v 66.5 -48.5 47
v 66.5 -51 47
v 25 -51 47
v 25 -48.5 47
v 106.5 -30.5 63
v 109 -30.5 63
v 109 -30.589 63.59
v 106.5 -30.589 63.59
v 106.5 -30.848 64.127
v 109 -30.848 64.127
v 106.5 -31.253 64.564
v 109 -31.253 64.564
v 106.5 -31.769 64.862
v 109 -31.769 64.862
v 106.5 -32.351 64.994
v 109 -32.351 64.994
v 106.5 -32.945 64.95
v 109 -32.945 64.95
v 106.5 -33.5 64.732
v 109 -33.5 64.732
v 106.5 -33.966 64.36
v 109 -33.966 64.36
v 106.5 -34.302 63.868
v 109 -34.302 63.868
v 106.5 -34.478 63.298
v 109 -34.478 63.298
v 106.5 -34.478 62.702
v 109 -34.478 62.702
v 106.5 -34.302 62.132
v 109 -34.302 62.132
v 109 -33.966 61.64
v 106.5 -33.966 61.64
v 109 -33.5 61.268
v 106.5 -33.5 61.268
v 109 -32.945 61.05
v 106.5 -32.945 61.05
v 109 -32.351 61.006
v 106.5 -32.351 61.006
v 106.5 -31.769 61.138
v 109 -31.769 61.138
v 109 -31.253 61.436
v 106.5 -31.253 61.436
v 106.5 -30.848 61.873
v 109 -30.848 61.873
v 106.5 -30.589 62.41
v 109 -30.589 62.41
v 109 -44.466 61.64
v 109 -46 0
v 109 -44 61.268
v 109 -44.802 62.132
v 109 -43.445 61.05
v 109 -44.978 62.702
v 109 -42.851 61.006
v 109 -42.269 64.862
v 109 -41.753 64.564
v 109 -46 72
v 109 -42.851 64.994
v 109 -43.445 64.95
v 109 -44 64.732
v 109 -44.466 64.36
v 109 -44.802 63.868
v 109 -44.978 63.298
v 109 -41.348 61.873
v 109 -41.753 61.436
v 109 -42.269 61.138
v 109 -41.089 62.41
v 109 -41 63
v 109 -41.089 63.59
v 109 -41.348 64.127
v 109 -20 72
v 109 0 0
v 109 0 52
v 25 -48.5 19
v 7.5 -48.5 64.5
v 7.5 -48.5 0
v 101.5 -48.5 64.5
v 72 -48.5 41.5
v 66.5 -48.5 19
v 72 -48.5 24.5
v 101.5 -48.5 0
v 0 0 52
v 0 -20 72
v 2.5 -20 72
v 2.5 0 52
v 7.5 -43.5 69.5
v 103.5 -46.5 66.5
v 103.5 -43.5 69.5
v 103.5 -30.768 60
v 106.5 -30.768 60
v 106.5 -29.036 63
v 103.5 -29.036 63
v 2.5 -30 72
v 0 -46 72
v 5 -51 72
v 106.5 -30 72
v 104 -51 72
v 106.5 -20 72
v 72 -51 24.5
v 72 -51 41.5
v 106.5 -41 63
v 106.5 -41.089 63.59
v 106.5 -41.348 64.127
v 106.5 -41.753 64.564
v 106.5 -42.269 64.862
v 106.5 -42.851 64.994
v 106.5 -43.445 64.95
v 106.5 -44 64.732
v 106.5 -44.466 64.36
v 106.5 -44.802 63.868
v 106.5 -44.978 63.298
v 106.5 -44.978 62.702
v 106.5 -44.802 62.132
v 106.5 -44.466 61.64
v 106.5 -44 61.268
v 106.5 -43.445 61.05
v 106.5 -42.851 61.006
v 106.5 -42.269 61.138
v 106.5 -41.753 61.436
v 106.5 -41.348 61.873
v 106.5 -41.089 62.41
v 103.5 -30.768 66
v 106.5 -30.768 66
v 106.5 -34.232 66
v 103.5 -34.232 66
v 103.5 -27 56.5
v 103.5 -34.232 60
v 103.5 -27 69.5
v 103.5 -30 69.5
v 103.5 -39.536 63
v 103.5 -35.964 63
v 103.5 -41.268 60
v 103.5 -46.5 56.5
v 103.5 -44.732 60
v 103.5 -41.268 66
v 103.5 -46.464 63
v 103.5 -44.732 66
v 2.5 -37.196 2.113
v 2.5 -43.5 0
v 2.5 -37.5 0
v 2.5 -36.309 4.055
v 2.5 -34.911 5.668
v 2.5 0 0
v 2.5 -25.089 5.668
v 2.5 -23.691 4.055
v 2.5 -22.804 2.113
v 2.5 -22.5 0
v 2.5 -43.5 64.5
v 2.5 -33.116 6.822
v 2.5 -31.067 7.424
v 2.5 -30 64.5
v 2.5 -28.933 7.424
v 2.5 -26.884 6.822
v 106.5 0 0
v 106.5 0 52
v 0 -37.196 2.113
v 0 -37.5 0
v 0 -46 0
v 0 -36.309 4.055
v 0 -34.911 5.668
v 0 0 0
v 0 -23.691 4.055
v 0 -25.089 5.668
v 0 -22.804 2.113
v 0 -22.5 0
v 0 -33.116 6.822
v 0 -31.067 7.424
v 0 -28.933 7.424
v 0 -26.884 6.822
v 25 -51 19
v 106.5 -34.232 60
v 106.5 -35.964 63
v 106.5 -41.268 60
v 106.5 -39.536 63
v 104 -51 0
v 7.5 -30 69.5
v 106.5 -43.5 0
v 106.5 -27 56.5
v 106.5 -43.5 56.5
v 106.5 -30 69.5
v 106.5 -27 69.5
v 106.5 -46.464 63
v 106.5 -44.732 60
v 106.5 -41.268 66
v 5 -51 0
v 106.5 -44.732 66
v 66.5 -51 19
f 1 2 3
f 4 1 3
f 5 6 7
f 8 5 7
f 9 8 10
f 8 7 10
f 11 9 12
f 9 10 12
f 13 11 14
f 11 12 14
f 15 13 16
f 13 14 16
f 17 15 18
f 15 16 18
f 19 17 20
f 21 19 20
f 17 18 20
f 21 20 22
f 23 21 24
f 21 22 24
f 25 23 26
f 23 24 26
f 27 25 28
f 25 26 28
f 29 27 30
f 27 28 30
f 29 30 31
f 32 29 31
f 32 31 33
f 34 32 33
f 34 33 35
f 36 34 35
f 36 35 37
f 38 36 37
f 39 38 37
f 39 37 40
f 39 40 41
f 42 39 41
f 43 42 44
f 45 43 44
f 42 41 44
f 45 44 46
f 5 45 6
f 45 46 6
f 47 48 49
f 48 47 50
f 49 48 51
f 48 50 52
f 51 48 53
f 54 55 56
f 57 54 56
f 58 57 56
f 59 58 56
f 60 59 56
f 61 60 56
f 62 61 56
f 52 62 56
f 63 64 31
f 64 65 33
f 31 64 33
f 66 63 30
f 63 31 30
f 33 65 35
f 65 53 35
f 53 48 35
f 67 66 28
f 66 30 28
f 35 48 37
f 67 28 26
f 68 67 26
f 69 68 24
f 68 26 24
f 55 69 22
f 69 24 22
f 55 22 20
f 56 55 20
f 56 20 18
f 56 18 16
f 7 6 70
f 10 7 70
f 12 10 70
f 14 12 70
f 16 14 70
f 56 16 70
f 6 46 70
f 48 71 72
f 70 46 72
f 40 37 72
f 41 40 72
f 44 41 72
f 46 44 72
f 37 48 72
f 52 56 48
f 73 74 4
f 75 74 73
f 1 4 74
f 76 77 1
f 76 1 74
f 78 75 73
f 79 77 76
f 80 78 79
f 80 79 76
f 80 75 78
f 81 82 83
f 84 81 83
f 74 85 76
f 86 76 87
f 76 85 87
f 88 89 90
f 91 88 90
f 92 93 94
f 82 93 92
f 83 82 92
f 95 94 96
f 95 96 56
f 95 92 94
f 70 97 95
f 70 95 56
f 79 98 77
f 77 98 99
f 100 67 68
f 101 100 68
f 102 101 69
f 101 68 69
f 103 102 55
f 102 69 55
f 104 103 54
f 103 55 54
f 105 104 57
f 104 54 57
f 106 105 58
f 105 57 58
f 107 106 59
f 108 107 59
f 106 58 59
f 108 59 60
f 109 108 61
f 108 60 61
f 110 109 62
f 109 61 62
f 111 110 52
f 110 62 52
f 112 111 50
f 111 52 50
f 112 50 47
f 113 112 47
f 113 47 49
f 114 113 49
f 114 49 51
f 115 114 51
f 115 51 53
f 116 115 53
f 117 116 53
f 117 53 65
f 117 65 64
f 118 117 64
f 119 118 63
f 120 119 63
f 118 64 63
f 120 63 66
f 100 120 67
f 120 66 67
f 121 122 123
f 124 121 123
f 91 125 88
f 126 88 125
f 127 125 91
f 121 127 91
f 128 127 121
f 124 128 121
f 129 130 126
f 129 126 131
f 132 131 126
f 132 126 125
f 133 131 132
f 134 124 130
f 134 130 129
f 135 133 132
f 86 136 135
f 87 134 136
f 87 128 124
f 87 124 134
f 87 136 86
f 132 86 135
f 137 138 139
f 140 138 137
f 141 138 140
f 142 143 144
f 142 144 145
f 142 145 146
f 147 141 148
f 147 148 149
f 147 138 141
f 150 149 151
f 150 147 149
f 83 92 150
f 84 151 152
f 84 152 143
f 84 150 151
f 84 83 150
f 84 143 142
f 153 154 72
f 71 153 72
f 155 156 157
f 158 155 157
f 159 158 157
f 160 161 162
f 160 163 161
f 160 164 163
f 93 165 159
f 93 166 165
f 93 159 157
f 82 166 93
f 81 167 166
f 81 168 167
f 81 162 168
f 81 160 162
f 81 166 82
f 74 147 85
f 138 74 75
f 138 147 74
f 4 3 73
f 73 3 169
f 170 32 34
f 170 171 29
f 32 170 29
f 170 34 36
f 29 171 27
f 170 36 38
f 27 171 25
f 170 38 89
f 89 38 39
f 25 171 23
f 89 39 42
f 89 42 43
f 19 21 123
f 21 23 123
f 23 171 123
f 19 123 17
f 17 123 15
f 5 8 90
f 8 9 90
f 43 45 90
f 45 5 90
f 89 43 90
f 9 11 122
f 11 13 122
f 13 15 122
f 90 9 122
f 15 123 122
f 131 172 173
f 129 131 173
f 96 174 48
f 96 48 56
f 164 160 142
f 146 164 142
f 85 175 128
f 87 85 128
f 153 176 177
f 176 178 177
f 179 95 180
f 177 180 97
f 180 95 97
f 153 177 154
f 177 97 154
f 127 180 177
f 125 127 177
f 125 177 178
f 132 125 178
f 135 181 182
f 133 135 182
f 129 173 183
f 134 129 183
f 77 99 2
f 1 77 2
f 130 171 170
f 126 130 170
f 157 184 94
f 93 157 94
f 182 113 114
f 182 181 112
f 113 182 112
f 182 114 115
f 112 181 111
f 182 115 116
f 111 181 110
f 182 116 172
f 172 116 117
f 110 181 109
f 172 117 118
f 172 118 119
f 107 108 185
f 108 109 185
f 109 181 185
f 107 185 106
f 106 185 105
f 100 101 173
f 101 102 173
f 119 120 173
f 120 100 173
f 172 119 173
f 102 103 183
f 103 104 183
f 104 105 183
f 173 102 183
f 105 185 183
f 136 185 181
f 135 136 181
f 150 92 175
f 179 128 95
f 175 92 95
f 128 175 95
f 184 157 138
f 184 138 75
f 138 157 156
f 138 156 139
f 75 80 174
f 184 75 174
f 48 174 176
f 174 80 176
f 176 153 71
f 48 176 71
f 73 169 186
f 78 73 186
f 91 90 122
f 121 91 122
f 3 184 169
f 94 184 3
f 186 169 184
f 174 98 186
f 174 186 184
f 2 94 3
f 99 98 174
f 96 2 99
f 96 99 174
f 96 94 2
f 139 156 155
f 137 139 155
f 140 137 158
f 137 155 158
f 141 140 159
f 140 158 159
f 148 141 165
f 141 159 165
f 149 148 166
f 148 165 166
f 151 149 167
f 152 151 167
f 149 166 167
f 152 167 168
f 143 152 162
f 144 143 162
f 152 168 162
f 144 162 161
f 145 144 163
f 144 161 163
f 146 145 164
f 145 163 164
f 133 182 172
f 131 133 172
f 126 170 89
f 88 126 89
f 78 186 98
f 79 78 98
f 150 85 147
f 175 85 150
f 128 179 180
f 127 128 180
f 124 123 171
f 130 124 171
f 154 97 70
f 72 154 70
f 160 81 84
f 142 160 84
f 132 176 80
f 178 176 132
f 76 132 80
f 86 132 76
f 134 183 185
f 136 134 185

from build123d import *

# Parameters (mm, degrees)
F0_W      = 109
F0_H      = 72
F1_DEPTH  = 51
F2_T      = -2.5
F3_W      = 104
F3_H      = 30
F4_DEPTH  = 2.5
F5_R      = 2
F6_DEPTH  = 2.5
F7_SIZE   = 20
F8_W      = 104
F8_H      = 48.5
F9_DEPTH  = 2.5
F11_DEPTH = 2.5
F14_DEPTH = 3
F15_DEPTH = 2.5
F16_SIZE  = 5
F17_SIZE  = 5


with BuildPart() as f1:
    # F0 (on Front) → F1 (new body)
    with BuildSketch(Plane.XZ):
        with Locations((54.5, 36)):
            Rectangle(F0_W, F0_H)
    extrude(amount=F1_DEPTH)

    # F2
    f2_openings = [f1.faces().sort_by_distance(p)[0] for p in [
        (54.5, 0, 36),
    ]]
    offset(amount=F2_T, openings=f2_openings)

    # F3 (on face) → F4 (cut, through all)
    with BuildSketch(Plane.XY.offset(72)):
        with Locations((54.5, -15)):
            Rectangle(F3_W, F3_H)
    extrude(amount=-F4_DEPTH, mode=Mode.SUBTRACT)

    # F5 (on face) → F6 (cut, through all)
    with BuildSketch(Plane.YZ.offset(109)):
        with Locations((-43, 63)):
            Circle(F5_R)
        with Locations((-32.5, 63)):
            Circle(F5_R)
    extrude(amount=-F6_DEPTH, mode=Mode.SUBTRACT)

    # F7
    f7_edges = [f1.edges().sort_by_distance(p)[0] for p in [
        (107.75, 0, 72),
        (1.25, 0, 72),
    ]]
    chamfer(f7_edges, length=F7_SIZE)

    # F8 (on face) → F9 (cut, through all)
    with BuildSketch(Plane(origin=(0, 0, 0), x_dir=(1, 0, 0), z_dir=(0, 0, -1))):
        with Locations((54.5, 24.25)):
            Rectangle(F8_W, F8_H)
    extrude(amount=-F9_DEPTH, mode=Mode.SUBTRACT)

    # F10 (on face) → F11 (cut, through all)
    with BuildSketch(Plane(origin=(0, 0, 0), x_dir=(0, -1, 0), z_dir=(-1, 0, 0))):
        with BuildLine():
            Line((22.5, 0), (37.5, 0))
            ThreePointArc((37.5, 0), (30, 7.5), (22.5, 0))
        make_face()
    extrude(amount=-F11_DEPTH, mode=Mode.SUBTRACT)

    # F13 (on face) → F14 (join)
    with BuildSketch(Plane(origin=(106.5, 0, 0), x_dir=(0, -1, 0), z_dir=(-1, 0, 0))):
        Polygon((48.5, 56.5), (48.5, 69.5), (30, 69.5), (27, 69.5), (27, 56.5), align=None)
        Polygon((29.0358983849, 63), (30.7679491924, 66), (34.2320508076, 66), (35.9641016151, 63), (34.2320508076, 60), (30.7679491924, 60), align=None, mode=Mode.SUBTRACT)
        Polygon((39.5358983849, 63), (41.2679491924, 66), (44.7320508076, 66), (46.4641016151, 63), (44.7320508076, 60), (41.2679491924, 60), align=None, mode=Mode.SUBTRACT)
    extrude(amount=F14_DEPTH)

    # F12 (on face) → F15 (cut, through all)
    with BuildSketch(Plane.XZ.offset(51)):
        Polygon((66.5, 47), (25, 47), (25, 19), (66.5, 19), (72, 24.5), (72, 41.5), align=None)
    extrude(amount=-F15_DEPTH, mode=Mode.SUBTRACT)

    # F16 (call 1 of 2: OpenCascade refuses the feature's edges together)
    f16_edges = [f1.edges().sort_by_distance(p)[0] for p in [
        (2.5, -48.5, 34.75),
        (2.5, -39.25, 69.5),
        (53, -48.5, 69.5),
    ]]
    chamfer(f16_edges, length=F16_SIZE)

    # F16#2 (call 2 of 2)
    f16_2_edges = [f1.edges().sort_by_distance(p)[0] for p in [
        (106.5, -48.5, 28.25),
    ]]
    chamfer(f16_2_edges, length=F16_SIZE)

    # F17
    f17_edges = [f1.edges().sort_by_distance(p)[0] for p in [
        (0, -51, 36),
        (109, -51, 36),
    ]]
    chamfer(f17_edges, length=F17_SIZE)


solid = f1.part
